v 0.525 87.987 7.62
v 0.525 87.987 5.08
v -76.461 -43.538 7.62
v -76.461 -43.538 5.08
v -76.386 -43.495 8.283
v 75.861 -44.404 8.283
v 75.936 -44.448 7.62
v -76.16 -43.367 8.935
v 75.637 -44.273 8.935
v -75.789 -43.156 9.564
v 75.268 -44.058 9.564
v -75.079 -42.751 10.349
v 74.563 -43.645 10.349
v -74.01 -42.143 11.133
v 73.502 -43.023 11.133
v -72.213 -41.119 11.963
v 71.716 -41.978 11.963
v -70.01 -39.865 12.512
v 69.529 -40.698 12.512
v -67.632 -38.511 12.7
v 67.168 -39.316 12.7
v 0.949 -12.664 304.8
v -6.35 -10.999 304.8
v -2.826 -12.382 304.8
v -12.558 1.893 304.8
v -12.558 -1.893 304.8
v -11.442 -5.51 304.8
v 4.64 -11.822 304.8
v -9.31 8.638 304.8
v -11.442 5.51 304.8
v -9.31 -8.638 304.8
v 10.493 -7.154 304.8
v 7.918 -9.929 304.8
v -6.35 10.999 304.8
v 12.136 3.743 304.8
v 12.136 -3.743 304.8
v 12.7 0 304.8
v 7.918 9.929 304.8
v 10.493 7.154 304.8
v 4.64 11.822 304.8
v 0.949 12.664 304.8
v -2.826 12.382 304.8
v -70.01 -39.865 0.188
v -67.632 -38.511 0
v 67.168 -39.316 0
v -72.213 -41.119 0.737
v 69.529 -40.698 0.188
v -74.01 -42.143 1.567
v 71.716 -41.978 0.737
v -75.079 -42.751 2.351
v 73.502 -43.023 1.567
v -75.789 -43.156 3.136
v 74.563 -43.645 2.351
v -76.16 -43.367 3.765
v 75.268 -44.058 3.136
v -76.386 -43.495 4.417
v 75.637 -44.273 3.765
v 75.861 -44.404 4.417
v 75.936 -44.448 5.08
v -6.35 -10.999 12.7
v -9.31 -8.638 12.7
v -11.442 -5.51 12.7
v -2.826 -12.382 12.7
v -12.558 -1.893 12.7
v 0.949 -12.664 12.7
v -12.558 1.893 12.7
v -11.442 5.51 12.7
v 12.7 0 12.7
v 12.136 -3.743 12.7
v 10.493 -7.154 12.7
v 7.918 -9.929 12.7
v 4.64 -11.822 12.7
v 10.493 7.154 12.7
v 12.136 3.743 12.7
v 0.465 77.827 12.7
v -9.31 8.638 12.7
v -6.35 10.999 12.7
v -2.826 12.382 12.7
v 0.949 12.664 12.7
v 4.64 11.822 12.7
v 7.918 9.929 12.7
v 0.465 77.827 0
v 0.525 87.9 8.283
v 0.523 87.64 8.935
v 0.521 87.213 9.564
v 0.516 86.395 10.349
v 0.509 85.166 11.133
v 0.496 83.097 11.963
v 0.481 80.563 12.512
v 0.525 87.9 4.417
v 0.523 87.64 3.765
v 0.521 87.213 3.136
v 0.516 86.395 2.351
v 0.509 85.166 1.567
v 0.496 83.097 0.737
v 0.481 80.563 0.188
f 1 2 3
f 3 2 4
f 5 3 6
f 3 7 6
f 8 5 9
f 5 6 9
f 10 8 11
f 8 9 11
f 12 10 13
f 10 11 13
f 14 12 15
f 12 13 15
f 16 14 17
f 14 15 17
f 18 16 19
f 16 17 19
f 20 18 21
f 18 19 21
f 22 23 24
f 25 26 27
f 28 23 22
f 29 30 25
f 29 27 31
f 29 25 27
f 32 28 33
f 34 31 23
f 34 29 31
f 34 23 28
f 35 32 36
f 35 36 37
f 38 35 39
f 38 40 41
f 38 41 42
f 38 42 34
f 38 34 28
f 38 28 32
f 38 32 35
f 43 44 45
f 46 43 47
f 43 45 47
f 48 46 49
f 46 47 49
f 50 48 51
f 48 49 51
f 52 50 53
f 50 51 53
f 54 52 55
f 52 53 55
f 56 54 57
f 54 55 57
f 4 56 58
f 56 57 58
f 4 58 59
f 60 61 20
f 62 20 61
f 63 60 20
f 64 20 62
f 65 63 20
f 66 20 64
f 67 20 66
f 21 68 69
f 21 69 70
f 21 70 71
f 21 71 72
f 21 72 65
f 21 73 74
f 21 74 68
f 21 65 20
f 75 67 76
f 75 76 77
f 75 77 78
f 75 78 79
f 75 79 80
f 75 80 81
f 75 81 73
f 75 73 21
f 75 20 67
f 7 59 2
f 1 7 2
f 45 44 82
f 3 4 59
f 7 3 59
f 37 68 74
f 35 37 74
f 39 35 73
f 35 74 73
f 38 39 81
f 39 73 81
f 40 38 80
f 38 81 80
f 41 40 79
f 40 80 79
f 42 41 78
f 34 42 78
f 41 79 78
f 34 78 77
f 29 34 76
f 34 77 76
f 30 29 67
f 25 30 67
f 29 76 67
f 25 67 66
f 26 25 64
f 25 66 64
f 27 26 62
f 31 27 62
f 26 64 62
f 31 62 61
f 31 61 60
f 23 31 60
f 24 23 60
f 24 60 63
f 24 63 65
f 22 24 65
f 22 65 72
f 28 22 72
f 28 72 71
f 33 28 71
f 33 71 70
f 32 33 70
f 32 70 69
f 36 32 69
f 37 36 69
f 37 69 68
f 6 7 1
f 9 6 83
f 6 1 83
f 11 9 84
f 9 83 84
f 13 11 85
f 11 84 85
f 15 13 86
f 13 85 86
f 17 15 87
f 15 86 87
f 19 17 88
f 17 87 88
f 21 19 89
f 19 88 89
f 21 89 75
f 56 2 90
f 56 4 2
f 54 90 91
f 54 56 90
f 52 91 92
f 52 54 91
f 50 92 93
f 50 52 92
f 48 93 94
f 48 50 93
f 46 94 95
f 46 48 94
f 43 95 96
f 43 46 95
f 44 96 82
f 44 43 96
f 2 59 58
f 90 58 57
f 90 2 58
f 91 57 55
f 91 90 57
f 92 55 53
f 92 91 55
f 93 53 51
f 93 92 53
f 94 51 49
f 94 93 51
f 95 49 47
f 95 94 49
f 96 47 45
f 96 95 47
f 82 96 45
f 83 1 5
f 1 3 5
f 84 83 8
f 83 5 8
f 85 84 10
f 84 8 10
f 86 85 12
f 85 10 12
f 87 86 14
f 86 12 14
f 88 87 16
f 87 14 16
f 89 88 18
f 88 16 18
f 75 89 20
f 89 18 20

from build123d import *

# Parameters (mm, degrees)
F1_DEPTH = 12.7
F2_R     = 12.7
F3_DEPTH = 304.8
F4_R     = 5.08
F5_R     = 5.08


with BuildPart() as f1:
    # F0 (on Top) → F1 (new body)
    with BuildSketch(Plane.XY):
        Polygon((0.525394, 87.986612), (-76.461339, -43.538301), (75.935944, -44.448311), align=None)
    extrude(amount=F1_DEPTH)

    # F2 (on Top) → F3 (join)
    with BuildSketch(Plane.XY):
        Circle(F2_R)
    extrude(amount=F3_DEPTH)

    # F4
    f4_edges = [f1.edges().sort_by_distance(p)[0] for p in [
        (-37.967972, 22.224156, 12.7),
        (38.230669, 21.769151, 12.7),
        (-0.262697, -43.993306, 12.7),
    ]]
    fillet(f4_edges, radius=F4_R)

    # F5
    f5_edges = [f1.edges().sort_by_distance(p)[0] for p in [
        (38.230669, 21.769151, 0),
        (-37.967972, 22.224156, 0),
        (-0.262697, -43.993306, 0),
    ]]
    fillet(f5_edges, radius=F5_R)


solid = f1.part
